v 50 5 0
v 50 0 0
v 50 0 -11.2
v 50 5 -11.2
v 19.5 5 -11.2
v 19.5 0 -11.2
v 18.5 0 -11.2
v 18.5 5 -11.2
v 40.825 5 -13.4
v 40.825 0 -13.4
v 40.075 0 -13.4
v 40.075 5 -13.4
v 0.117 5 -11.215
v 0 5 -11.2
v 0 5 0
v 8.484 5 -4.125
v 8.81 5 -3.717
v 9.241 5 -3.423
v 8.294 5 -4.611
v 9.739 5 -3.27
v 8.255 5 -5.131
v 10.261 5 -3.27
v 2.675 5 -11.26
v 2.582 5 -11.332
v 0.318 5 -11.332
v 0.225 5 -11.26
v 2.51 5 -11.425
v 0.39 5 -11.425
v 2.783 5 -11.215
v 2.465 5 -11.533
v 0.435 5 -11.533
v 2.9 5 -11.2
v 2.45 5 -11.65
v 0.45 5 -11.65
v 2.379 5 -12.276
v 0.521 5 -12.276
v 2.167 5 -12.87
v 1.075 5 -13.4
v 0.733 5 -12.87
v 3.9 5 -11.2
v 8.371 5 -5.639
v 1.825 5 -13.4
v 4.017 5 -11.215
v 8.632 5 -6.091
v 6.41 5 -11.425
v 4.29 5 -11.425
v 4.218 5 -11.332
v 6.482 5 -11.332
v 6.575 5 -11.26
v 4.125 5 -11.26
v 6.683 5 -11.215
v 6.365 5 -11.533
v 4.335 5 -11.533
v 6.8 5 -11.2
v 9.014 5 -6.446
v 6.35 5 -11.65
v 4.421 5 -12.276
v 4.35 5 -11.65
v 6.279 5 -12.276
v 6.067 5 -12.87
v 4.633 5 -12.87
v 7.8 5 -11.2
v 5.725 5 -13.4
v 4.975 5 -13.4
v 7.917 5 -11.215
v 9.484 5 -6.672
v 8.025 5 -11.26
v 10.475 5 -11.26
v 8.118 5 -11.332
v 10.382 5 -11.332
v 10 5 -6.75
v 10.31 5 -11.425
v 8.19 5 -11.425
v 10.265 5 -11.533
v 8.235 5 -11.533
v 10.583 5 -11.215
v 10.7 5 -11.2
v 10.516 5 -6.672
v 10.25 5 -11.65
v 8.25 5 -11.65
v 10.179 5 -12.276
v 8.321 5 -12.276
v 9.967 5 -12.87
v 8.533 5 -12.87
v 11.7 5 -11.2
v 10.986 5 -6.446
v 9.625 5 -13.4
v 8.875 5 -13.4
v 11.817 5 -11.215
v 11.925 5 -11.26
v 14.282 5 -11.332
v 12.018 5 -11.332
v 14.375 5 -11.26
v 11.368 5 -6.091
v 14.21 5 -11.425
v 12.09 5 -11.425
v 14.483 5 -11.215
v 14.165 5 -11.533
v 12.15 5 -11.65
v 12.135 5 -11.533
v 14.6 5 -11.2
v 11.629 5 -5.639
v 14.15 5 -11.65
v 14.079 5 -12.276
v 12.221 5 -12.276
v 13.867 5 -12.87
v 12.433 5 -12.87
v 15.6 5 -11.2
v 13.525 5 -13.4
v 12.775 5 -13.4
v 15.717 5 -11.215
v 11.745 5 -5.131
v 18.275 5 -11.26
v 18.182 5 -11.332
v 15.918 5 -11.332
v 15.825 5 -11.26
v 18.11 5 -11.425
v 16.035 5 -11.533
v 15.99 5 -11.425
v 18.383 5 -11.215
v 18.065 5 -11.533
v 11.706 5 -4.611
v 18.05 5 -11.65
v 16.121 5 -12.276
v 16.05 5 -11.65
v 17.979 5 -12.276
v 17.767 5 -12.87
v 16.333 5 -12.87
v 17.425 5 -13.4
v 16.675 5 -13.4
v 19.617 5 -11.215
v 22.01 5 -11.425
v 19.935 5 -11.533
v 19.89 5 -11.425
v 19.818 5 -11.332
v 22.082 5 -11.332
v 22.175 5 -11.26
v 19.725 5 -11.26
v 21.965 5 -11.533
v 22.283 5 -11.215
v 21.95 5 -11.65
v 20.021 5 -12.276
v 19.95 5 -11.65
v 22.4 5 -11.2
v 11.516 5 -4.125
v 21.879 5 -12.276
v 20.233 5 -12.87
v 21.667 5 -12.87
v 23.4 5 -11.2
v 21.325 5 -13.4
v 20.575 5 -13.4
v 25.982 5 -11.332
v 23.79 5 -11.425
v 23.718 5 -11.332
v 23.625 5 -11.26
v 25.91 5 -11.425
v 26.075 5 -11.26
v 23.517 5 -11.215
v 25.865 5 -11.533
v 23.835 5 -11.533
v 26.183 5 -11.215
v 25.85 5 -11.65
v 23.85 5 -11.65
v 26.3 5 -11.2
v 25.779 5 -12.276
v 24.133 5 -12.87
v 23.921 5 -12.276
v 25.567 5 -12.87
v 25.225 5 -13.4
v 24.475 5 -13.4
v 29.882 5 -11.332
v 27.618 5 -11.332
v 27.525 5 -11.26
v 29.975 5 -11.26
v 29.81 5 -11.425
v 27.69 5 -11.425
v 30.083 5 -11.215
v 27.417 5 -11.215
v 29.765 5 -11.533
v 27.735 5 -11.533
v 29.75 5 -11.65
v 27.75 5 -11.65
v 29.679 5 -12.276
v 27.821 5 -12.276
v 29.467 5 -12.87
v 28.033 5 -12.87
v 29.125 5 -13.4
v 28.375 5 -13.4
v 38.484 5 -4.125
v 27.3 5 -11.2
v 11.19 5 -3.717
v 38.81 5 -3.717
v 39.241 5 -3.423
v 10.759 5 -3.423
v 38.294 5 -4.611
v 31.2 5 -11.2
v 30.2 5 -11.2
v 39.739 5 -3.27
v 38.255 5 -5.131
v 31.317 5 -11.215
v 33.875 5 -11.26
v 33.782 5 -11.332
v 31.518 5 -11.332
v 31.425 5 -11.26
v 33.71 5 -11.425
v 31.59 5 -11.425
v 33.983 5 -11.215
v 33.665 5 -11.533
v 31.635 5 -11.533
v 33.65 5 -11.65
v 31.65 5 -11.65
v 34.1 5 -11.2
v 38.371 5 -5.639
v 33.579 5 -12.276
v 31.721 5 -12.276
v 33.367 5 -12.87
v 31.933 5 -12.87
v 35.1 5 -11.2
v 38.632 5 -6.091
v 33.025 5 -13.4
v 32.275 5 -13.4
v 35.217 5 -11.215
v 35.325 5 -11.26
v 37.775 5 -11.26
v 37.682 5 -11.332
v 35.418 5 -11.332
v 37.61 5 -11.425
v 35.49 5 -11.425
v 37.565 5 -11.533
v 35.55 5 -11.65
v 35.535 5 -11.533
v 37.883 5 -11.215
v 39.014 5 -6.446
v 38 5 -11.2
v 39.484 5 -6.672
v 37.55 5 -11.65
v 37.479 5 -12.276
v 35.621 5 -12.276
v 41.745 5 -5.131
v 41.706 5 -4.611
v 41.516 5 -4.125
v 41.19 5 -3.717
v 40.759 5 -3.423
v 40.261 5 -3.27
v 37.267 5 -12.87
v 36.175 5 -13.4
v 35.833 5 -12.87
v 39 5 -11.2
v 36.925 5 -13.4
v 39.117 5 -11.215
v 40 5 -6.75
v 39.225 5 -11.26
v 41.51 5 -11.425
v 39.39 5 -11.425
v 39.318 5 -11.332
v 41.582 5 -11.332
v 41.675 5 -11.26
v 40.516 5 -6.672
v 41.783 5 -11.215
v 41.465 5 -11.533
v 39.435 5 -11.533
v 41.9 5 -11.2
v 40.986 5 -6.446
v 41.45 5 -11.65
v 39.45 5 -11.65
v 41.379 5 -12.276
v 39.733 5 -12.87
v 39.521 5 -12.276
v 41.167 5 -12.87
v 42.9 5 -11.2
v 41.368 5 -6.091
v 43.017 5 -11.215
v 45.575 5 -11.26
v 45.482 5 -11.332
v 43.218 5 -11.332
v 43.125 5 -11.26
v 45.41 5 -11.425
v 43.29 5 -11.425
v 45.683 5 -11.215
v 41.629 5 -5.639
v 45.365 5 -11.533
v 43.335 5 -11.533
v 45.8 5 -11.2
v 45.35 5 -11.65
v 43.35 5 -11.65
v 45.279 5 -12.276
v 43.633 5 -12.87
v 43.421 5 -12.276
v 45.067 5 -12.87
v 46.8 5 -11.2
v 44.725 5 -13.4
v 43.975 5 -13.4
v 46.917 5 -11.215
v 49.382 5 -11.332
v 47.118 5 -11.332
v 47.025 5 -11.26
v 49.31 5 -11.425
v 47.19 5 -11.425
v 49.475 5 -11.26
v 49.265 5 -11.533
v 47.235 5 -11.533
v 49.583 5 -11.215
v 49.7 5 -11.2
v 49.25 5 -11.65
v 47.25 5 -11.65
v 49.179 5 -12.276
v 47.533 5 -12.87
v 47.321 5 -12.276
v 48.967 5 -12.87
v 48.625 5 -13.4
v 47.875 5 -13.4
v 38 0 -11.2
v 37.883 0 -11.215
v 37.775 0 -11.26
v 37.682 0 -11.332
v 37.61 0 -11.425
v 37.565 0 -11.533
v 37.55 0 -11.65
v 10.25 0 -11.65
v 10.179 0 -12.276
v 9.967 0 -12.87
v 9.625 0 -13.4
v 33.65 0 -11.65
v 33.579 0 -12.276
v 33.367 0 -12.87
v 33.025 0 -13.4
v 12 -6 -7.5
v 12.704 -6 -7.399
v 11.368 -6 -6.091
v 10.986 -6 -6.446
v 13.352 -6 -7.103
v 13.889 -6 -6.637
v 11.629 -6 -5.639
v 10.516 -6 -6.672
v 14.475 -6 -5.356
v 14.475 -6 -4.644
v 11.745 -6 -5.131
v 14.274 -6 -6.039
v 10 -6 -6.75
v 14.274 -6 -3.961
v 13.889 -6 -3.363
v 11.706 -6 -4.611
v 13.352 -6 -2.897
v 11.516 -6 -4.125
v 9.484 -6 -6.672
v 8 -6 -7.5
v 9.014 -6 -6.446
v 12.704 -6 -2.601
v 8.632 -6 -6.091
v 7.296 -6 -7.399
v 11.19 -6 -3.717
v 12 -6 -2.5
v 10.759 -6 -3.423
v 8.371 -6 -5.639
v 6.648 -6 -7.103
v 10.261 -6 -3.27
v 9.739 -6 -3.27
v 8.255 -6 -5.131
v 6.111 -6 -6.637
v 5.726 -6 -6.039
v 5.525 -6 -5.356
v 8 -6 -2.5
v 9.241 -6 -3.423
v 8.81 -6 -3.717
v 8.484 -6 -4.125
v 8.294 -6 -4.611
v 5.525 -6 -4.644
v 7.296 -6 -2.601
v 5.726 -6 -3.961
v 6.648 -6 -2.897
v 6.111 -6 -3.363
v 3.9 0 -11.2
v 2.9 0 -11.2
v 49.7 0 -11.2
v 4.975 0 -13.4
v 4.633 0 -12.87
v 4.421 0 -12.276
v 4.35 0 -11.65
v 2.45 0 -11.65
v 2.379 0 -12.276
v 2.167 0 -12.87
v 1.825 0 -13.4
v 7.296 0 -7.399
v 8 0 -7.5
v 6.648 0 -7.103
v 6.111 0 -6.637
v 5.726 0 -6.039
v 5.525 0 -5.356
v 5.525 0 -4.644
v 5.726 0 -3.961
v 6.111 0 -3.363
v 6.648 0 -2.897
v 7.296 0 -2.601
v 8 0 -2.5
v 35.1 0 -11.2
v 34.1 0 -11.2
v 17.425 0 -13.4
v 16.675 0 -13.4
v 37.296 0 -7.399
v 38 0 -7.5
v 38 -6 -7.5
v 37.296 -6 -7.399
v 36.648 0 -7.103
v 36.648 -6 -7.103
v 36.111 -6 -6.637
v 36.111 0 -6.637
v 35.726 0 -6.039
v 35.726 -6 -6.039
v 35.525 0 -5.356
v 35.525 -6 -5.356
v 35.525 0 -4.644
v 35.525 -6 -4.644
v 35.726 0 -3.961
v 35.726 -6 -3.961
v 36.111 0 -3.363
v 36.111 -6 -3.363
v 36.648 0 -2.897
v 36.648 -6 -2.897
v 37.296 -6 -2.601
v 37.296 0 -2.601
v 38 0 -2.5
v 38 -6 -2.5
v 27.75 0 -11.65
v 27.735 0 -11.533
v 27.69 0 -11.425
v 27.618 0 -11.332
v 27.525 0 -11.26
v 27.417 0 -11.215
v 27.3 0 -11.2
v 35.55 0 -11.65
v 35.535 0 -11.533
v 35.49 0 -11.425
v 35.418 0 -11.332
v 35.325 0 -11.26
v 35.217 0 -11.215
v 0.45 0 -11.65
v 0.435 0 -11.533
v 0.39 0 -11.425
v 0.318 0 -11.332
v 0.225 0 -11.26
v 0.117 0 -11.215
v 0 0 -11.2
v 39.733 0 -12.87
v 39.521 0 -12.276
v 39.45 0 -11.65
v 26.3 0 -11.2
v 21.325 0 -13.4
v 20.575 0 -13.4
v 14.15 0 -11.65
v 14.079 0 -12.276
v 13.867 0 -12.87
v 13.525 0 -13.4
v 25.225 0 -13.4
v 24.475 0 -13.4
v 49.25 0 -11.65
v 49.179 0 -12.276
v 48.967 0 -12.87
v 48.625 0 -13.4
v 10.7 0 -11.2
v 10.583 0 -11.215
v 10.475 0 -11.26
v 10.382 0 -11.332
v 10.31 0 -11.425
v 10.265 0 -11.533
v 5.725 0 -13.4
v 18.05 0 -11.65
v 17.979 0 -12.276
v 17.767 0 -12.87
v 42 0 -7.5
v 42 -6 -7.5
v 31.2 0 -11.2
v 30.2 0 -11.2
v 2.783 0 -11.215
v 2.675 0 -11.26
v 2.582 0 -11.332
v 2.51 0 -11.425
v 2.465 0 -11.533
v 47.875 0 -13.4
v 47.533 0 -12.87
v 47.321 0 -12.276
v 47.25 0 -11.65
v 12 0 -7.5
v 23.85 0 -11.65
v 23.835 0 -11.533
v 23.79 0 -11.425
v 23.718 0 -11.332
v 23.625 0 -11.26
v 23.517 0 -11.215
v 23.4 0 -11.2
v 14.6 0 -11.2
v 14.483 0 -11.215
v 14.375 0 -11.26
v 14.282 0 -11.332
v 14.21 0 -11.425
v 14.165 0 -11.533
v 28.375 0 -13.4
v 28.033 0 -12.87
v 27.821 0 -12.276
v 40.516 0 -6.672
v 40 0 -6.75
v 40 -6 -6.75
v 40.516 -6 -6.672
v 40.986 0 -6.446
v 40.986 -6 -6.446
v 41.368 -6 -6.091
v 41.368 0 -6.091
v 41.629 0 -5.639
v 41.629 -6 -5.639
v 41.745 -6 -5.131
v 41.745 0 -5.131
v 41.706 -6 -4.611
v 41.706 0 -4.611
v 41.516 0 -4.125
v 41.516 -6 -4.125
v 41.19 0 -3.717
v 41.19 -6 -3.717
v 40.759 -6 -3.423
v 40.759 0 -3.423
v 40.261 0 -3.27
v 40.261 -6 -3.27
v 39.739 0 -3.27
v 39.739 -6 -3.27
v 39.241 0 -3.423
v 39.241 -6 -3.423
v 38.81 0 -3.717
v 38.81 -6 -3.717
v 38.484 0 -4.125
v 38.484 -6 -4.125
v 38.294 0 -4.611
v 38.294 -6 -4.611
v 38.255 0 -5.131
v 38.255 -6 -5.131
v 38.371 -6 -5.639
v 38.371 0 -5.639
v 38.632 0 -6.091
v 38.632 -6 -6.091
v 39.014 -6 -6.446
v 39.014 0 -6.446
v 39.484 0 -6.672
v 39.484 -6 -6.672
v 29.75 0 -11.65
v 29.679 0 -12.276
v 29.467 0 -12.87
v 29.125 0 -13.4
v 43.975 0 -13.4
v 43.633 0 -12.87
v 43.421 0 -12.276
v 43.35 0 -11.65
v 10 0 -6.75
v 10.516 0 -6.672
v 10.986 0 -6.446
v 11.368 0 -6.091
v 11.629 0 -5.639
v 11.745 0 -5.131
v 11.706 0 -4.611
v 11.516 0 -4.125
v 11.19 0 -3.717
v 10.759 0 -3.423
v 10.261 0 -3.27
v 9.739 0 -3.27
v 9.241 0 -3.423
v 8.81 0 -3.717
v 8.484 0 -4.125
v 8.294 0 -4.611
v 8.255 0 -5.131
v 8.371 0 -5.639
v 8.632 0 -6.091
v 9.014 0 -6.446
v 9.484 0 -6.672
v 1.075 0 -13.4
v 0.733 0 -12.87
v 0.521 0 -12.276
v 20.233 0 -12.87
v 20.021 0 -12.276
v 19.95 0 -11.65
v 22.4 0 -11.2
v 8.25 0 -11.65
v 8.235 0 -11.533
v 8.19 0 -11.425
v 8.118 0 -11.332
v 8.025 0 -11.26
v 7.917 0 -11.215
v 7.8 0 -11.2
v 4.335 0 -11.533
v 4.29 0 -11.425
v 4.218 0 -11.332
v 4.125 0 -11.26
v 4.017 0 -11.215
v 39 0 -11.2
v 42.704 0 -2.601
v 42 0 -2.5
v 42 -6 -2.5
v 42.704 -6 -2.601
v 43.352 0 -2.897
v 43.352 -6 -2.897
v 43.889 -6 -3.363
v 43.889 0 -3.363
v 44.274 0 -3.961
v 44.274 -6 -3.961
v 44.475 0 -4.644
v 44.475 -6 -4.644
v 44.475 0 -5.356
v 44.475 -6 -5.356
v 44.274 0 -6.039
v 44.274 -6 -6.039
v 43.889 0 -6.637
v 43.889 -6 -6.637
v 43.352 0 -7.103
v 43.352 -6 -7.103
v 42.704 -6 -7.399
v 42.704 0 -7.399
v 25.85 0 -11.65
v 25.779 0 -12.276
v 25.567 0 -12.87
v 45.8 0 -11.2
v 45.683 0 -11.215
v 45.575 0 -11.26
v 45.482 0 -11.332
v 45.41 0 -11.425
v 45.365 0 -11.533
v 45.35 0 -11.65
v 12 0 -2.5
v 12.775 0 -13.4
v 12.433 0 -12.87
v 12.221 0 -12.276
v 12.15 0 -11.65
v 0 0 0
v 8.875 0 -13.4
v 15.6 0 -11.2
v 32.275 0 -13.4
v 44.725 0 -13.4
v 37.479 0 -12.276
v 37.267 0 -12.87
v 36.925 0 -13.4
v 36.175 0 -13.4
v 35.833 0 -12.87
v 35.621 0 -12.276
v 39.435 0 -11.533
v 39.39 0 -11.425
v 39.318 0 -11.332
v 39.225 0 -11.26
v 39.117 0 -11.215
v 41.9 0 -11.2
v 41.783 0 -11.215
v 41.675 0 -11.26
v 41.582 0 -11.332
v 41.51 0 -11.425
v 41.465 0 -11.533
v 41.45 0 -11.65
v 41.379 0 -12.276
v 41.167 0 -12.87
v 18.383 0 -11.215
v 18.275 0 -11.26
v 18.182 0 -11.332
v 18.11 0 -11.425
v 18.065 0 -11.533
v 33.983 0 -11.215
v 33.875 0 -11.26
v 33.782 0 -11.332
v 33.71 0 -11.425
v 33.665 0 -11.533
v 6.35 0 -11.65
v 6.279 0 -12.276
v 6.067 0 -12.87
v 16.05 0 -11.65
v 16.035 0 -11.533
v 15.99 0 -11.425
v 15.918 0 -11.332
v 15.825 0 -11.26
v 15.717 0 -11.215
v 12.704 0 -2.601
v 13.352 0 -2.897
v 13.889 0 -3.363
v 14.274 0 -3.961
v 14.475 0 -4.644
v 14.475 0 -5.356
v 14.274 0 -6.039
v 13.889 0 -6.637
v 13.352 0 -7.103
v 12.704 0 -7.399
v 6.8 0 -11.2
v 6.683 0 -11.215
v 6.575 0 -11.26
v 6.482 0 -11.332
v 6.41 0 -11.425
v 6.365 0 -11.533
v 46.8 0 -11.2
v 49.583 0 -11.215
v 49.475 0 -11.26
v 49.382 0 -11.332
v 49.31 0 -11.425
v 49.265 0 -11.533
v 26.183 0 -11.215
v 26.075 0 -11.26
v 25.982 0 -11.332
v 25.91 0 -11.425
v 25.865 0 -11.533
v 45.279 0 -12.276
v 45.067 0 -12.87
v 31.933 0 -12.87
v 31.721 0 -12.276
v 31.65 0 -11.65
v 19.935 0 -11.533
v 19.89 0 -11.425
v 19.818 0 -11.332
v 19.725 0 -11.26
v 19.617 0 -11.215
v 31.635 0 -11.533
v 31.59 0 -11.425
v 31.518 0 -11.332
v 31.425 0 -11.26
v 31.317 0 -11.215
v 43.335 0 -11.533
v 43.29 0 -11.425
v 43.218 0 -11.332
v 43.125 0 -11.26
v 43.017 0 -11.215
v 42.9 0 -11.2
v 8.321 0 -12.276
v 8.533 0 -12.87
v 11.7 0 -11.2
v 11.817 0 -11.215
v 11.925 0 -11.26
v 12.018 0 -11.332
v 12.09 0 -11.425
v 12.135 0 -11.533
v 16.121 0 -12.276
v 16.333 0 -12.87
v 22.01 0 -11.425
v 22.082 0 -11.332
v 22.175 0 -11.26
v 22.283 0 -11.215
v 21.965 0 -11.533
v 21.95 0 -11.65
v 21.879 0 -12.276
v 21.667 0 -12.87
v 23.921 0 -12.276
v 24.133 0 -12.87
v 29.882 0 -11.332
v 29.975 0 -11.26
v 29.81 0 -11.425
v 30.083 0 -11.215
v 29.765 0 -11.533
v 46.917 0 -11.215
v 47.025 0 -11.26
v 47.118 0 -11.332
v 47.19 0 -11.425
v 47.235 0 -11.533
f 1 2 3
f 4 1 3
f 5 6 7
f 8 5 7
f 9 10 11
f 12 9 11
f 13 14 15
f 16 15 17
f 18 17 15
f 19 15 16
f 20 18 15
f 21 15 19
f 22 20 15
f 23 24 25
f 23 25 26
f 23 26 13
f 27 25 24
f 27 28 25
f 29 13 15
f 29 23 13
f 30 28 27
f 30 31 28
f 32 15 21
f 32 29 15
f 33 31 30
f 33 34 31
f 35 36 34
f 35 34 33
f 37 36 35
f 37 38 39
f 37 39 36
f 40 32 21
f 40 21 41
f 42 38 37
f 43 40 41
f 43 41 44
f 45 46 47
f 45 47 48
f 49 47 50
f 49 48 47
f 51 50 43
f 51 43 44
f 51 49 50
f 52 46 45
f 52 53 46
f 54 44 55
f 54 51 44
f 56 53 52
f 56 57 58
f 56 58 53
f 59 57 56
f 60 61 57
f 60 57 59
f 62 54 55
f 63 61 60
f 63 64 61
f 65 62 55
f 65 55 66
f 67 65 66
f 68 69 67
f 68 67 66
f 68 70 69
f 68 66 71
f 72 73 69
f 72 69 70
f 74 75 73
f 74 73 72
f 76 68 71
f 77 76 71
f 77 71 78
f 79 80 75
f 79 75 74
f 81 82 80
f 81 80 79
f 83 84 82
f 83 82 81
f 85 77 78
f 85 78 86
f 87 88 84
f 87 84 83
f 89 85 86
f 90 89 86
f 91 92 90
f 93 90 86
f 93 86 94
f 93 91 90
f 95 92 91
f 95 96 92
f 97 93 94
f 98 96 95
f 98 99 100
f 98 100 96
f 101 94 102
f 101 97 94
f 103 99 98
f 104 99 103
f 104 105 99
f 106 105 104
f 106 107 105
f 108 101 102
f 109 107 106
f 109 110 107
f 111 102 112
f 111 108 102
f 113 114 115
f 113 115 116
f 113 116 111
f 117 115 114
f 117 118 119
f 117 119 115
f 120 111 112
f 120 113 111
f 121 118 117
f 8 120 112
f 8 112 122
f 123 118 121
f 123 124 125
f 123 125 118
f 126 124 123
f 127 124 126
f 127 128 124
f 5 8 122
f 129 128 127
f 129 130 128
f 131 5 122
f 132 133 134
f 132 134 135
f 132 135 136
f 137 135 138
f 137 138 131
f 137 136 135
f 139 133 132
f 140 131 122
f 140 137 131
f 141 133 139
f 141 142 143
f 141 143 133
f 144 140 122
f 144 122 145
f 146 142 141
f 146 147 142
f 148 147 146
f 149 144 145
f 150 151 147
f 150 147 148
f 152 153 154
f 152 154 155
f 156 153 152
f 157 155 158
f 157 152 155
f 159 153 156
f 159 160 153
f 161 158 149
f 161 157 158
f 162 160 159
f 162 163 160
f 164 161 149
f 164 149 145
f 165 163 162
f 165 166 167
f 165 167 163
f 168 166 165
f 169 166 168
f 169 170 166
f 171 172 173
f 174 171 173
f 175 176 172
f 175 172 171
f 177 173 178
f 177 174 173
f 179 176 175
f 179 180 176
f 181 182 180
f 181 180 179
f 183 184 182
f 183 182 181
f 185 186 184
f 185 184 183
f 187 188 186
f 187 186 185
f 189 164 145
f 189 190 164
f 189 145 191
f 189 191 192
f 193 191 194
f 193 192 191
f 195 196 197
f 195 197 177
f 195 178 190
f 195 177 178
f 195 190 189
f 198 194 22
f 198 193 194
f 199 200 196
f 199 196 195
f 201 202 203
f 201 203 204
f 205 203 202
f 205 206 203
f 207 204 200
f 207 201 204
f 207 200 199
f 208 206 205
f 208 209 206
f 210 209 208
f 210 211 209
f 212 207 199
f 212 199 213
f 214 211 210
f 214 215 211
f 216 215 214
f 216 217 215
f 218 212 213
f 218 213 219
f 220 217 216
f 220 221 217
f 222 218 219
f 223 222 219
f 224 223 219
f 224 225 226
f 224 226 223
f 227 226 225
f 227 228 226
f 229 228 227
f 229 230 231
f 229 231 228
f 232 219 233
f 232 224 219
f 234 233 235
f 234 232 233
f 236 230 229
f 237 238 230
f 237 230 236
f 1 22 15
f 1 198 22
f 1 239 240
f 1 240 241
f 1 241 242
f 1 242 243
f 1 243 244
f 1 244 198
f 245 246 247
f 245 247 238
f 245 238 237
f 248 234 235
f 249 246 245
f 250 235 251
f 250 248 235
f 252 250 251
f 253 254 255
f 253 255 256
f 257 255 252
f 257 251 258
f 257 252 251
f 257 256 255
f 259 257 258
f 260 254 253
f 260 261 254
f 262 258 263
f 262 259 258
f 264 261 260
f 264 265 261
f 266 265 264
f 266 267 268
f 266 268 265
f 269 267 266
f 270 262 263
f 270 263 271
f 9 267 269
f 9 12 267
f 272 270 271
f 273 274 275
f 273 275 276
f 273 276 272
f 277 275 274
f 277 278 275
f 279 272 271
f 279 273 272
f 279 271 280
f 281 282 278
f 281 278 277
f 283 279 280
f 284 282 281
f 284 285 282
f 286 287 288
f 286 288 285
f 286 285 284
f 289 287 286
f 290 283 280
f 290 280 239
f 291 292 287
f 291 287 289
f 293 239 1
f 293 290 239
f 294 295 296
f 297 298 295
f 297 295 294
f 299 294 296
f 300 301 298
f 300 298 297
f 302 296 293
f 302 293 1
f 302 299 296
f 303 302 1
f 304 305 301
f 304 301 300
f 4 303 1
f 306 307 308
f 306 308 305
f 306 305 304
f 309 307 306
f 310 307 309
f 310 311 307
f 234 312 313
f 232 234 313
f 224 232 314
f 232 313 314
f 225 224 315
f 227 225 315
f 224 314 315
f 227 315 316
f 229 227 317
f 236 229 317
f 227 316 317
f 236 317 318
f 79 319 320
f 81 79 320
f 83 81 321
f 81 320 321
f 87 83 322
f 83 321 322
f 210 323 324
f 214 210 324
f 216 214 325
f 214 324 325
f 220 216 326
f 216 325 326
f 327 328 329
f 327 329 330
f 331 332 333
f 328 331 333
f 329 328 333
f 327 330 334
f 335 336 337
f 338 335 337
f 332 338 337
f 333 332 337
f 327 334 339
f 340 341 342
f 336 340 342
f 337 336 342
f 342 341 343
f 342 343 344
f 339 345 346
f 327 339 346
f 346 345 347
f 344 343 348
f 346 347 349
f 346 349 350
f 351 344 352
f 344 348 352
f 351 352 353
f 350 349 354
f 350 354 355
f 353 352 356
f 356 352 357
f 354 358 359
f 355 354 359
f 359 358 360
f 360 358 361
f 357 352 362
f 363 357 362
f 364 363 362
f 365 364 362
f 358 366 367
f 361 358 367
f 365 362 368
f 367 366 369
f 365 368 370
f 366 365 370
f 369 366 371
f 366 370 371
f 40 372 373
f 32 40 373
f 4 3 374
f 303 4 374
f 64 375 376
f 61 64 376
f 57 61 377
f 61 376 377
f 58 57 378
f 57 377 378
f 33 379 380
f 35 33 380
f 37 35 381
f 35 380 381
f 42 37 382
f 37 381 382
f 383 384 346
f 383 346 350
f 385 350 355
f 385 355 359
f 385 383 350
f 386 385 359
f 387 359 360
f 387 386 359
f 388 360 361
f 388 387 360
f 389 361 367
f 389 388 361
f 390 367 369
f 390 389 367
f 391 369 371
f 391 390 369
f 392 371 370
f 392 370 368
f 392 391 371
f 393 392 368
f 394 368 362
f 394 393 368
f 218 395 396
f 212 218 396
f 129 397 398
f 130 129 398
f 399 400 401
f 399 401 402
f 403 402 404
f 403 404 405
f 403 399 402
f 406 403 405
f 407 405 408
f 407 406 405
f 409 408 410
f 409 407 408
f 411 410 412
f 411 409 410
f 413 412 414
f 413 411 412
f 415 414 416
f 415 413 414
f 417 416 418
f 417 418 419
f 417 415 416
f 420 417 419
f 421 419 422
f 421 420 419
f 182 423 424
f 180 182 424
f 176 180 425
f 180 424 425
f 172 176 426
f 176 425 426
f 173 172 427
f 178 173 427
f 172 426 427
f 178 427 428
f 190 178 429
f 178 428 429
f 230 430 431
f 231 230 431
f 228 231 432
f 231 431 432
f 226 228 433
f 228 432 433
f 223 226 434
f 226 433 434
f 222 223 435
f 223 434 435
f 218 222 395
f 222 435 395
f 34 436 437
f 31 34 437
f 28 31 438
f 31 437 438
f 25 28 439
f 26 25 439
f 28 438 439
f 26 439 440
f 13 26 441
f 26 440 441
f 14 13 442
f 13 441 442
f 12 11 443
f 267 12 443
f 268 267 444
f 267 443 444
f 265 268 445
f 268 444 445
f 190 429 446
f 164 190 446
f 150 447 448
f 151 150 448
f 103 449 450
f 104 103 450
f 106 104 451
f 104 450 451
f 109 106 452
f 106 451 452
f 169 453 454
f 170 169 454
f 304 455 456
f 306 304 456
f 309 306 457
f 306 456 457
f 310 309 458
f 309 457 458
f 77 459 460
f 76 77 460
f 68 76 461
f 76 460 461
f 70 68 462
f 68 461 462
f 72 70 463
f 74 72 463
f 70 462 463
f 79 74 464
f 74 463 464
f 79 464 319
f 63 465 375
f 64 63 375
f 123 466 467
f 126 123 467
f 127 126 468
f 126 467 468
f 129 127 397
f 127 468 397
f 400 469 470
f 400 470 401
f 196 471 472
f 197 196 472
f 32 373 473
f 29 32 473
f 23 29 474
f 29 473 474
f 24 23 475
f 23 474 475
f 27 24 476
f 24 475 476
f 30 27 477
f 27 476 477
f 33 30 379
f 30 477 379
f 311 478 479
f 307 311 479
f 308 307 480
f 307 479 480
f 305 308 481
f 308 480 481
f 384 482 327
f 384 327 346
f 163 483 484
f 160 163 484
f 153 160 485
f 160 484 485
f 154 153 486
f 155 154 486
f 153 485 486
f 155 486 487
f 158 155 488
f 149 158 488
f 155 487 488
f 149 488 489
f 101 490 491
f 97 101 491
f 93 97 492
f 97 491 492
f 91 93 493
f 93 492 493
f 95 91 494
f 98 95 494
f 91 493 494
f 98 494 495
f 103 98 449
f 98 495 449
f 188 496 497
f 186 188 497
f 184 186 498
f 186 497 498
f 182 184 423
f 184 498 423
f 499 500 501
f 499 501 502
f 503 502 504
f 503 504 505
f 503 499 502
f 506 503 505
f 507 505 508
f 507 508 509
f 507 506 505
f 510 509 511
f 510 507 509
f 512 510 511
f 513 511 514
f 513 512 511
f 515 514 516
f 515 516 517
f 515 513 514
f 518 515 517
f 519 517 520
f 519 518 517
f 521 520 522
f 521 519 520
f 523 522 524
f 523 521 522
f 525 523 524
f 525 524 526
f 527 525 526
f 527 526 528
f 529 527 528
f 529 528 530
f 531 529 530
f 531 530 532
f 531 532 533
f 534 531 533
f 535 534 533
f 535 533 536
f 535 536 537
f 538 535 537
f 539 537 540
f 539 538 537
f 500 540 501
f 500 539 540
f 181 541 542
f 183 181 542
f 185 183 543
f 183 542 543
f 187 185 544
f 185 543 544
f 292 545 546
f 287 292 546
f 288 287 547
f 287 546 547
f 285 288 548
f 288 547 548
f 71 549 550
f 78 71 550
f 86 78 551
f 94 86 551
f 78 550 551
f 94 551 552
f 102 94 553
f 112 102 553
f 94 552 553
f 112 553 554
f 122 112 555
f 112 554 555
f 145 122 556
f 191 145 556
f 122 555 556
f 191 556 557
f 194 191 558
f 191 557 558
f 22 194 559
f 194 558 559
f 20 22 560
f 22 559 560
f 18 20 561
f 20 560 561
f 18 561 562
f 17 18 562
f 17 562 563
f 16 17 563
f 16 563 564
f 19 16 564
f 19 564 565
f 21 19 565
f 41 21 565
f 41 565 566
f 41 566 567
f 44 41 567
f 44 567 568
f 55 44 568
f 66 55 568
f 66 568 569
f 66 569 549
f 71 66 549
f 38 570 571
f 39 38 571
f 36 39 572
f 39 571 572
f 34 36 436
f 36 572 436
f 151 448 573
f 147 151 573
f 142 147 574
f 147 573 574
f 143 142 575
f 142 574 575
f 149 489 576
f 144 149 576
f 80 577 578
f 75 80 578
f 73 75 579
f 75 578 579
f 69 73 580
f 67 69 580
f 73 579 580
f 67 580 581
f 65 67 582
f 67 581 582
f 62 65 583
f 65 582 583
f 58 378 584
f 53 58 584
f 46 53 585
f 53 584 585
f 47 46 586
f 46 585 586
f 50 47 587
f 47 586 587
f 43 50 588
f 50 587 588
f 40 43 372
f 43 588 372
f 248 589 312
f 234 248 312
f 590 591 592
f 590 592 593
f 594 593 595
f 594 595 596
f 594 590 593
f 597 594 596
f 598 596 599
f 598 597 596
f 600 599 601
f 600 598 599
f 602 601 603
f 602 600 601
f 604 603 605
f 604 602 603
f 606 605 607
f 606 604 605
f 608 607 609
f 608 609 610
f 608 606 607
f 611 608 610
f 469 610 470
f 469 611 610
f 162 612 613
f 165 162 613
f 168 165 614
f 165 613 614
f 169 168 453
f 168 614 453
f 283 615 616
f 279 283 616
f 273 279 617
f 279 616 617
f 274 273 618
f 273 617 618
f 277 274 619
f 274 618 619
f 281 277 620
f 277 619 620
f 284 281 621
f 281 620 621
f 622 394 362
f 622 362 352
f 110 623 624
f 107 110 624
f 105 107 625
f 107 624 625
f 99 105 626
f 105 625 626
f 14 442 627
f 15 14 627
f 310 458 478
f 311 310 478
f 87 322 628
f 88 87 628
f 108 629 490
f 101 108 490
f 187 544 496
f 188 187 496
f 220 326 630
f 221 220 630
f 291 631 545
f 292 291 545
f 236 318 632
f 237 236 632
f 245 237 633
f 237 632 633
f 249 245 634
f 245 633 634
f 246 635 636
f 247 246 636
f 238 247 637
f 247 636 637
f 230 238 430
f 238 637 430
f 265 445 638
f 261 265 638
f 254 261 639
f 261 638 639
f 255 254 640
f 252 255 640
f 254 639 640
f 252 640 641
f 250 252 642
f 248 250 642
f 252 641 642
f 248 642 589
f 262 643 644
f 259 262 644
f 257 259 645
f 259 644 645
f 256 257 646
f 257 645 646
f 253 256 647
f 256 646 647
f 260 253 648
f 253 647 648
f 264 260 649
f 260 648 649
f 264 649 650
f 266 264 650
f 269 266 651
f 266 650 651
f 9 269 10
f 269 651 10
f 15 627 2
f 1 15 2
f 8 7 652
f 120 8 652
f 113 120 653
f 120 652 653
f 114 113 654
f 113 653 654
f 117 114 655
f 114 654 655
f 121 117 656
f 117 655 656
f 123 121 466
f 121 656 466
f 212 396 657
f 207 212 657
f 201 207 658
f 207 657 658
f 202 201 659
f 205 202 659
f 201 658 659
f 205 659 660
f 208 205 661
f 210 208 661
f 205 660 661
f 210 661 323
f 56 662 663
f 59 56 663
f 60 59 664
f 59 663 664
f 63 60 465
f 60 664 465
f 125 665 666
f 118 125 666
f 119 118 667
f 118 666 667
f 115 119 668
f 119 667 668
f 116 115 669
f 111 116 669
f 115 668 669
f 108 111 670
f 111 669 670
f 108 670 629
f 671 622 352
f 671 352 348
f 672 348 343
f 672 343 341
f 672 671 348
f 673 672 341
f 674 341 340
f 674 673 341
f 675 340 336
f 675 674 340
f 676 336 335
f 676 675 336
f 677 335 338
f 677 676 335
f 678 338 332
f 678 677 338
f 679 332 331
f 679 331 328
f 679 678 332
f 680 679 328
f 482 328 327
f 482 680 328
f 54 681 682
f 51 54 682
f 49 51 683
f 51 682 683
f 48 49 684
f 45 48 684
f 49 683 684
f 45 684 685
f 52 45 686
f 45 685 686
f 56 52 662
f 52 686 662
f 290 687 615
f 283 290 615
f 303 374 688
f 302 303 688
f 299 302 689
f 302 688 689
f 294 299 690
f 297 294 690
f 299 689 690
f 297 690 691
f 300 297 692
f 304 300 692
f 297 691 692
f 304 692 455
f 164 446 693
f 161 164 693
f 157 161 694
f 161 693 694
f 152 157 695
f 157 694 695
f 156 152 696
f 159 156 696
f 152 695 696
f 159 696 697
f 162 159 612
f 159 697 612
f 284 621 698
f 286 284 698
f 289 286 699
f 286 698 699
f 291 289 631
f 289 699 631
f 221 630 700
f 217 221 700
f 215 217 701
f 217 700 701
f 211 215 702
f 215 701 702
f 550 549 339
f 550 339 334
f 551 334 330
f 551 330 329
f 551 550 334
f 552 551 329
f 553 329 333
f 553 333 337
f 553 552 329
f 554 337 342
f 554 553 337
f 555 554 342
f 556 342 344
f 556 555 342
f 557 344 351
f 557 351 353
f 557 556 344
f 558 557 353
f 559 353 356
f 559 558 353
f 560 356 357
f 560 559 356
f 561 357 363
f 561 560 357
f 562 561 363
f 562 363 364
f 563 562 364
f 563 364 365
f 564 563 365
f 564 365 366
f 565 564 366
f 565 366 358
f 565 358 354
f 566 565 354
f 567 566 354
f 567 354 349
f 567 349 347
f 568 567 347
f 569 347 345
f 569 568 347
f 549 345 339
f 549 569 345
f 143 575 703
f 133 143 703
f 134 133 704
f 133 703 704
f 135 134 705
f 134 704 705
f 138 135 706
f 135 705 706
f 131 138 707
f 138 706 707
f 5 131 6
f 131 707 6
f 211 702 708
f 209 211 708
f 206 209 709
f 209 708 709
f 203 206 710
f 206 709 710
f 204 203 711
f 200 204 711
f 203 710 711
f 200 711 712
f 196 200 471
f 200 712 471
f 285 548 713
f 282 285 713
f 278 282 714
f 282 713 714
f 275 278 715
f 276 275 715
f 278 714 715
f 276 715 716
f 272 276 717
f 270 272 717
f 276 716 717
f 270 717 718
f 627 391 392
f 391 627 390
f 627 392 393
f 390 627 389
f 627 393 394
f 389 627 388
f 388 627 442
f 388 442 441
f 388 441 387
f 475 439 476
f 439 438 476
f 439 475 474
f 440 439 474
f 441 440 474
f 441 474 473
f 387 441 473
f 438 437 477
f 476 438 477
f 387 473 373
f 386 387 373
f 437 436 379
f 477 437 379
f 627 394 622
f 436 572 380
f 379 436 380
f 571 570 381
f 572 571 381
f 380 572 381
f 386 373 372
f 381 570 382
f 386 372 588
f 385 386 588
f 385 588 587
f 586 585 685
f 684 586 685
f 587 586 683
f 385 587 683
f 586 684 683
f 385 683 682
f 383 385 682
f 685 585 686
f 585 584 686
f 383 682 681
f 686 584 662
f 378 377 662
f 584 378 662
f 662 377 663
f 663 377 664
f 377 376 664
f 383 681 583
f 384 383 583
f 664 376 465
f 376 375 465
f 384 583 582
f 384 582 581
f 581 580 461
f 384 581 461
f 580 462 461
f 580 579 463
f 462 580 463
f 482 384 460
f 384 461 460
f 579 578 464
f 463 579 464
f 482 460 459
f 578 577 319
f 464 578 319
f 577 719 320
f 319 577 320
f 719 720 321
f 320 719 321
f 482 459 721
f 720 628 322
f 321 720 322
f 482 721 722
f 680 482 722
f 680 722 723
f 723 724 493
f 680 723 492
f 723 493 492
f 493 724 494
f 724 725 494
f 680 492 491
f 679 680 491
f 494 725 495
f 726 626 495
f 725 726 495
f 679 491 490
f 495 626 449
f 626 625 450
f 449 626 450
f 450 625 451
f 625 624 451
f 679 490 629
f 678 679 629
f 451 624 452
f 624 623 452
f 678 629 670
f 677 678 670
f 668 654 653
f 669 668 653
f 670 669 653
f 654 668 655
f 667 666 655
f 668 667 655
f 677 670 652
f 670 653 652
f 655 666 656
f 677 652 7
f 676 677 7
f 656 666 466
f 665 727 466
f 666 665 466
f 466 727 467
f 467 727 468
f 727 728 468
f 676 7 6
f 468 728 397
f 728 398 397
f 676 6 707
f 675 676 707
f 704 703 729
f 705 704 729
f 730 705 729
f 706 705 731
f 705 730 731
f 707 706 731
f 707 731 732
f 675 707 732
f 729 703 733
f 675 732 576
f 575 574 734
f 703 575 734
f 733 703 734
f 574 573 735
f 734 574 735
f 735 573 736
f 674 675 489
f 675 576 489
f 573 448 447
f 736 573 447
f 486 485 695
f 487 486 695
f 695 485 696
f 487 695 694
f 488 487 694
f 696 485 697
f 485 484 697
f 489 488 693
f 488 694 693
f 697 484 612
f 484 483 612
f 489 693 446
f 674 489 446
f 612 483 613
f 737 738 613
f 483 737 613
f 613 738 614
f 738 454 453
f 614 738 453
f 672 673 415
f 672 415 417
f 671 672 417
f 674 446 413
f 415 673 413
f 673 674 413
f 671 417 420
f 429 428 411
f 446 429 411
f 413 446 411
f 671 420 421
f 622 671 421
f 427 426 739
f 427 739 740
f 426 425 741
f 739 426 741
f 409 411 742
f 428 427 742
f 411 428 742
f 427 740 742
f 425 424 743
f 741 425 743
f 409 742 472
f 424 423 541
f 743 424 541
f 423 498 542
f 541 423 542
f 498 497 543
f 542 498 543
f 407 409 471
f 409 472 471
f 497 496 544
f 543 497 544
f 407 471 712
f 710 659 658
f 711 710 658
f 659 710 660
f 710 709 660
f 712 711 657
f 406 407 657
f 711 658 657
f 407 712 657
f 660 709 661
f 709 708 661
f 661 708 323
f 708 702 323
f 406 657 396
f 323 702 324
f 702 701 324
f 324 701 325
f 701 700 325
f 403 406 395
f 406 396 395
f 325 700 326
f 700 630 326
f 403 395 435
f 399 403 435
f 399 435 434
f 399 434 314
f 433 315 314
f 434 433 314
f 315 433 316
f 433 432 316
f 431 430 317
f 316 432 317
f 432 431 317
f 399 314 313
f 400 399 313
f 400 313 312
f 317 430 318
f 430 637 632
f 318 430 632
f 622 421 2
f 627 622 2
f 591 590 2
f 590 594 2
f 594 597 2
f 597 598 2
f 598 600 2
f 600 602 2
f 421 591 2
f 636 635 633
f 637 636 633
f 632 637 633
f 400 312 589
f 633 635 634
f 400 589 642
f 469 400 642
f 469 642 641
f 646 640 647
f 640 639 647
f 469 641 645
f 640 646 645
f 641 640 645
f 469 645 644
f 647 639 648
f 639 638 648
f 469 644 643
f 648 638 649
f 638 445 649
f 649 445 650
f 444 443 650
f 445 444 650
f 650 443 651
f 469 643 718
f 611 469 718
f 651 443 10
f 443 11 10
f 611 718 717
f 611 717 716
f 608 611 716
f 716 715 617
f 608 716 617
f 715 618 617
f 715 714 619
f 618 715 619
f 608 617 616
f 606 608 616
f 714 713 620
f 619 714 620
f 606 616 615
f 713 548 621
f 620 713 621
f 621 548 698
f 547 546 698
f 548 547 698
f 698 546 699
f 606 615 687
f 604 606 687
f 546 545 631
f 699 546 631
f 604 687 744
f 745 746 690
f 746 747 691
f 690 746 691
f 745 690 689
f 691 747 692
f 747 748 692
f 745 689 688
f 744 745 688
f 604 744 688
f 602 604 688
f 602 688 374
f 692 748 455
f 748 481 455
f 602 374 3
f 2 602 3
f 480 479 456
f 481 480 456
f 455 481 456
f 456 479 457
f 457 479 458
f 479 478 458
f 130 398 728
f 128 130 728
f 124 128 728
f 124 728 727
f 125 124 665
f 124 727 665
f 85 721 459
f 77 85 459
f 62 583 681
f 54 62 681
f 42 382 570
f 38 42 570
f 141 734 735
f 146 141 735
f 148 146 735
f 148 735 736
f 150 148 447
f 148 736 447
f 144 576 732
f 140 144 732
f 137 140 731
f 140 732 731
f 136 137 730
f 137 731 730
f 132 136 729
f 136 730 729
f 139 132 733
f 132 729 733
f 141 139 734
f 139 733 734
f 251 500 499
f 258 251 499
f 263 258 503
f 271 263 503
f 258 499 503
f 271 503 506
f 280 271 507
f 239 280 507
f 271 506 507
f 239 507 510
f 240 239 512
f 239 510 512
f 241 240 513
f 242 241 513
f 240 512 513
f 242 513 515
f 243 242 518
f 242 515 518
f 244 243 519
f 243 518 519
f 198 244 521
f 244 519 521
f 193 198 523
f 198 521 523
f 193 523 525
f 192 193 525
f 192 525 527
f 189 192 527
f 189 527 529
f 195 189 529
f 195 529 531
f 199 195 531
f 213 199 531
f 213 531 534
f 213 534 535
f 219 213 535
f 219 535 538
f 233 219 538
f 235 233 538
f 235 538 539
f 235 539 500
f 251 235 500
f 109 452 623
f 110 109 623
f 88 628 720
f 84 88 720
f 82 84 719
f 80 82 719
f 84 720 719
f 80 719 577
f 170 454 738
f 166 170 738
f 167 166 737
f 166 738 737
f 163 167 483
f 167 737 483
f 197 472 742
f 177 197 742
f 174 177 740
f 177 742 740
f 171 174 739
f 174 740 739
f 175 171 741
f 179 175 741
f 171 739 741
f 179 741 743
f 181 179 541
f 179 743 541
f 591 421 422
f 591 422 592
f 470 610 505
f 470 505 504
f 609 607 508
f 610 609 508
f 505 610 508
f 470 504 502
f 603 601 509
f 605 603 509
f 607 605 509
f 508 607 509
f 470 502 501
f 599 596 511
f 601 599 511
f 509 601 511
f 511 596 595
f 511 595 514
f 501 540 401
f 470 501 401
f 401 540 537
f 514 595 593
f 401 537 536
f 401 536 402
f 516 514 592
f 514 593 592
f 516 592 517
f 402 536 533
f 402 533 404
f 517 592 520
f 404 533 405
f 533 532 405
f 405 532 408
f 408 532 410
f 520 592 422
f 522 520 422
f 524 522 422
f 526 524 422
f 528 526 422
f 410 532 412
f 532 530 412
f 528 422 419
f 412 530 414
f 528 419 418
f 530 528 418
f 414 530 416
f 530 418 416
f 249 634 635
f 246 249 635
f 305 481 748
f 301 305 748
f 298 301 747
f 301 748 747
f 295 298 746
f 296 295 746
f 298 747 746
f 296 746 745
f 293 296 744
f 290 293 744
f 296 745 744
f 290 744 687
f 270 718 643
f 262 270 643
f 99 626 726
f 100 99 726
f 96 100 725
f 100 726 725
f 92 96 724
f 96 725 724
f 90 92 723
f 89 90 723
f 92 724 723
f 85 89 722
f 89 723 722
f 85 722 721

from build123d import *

# Parameters (mm, degrees)
BOSS_EXTRUDE1_DEPTH = 5
SKETCH2_R           = 1.75
BOSS_EXTRUDE2_DEPTH = 6
CUT_EXTRUDE1_REACH  = 54.111
SKETCH3_R           = 1.75


with BuildPart() as part:
    # Sketch1 → Boss-Extrude1 (new body)
    with BuildSketch(Plane(origin=(0, 0, 0), x_dir=(1, 0, 0), z_dir=(0, 1, 0))):
        with BuildLine():
            Line((0, 0), (50, 0))
            Line((50, 0), (50, 11.2))
            Line((50, 11.2), (49.7, 11.2))
            ThreePointArc((49.7, 11.2), (49.38158785, 11.33158785), (49.25, 11.65))
            ThreePointArc((49.25, 11.65), (49.089793883, 12.579390672), (48.625, 13.4))
            Line((48.625, 13.4), (47.875, 13.4))
            ThreePointArc((47.875, 13.4), (47.410206117, 12.579390672), (47.25, 11.65))
            ThreePointArc((47.25, 11.65), (47.11841215, 11.33158785), (46.8, 11.2))
            Line((46.8, 11.2), (45.8, 11.2))
            ThreePointArc((45.8, 11.2), (45.48158785, 11.33158785), (45.35, 11.65))
            ThreePointArc((45.35, 11.65), (45.189793883, 12.579390672), (44.725, 13.4))
            Line((44.725, 13.4), (43.975, 13.4))
            ThreePointArc((43.975, 13.4), (43.510206117, 12.579390672), (43.35, 11.65))
            ThreePointArc((43.35, 11.65), (43.21841215, 11.33158785), (42.9, 11.2))
            Line((42.9, 11.2), (41.9, 11.2))
            ThreePointArc((41.9, 11.2), (41.58158785, 11.33158785), (41.45, 11.65))
            ThreePointArc((41.45, 11.65), (41.289793883, 12.579390672), (40.825, 13.4))
            Line((40.825, 13.4), (40.075, 13.4))
            ThreePointArc((40.075, 13.4), (39.610206117, 12.579390672), (39.45, 11.65))
            ThreePointArc((39.45, 11.65), (39.31841215, 11.33158785), (39, 11.2))
            Line((39, 11.2), (38, 11.2))
            ThreePointArc((38, 11.2), (37.68158785, 11.33158785), (37.55, 11.65))
            ThreePointArc((37.55, 11.65), (37.389793883, 12.579390672), (36.925, 13.4))
            Line((36.925, 13.4), (36.175, 13.4))
            ThreePointArc((36.175, 13.4), (35.710206117, 12.579390672), (35.55, 11.65))
            ThreePointArc((35.55, 11.65), (35.41841215, 11.33158785), (35.1, 11.2))
            Line((35.1, 11.2), (34.1, 11.2))
            ThreePointArc((34.1, 11.2), (33.78158785, 11.33158785), (33.65, 11.65))
            ThreePointArc((33.65, 11.65), (33.489793883, 12.579390672), (33.025, 13.4))
            Line((33.025, 13.4), (32.275, 13.4))
            ThreePointArc((32.275, 13.4), (31.810206117, 12.579390672), (31.65, 11.65))
            ThreePointArc((31.65, 11.65), (31.51841215, 11.33158785), (31.2, 11.2))
            Line((31.2, 11.2), (30.2, 11.2))
            ThreePointArc((30.2, 11.2), (29.88158785, 11.33158785), (29.75, 11.65))
            ThreePointArc((29.75, 11.65), (29.589793883, 12.579390672), (29.125, 13.4))
            Line((29.125, 13.4), (28.375, 13.4))
            ThreePointArc((28.375, 13.4), (27.910206117, 12.579390672), (27.75, 11.65))
            ThreePointArc((27.75, 11.65), (27.61841215, 11.33158785), (27.3, 11.2))
            Line((27.3, 11.2), (26.3, 11.2))
            ThreePointArc((26.3, 11.2), (25.98158785, 11.33158785), (25.85, 11.65))
            ThreePointArc((25.85, 11.65), (25.689793883, 12.579390672), (25.225, 13.4))
            Line((25.225, 13.4), (24.475, 13.4))
            ThreePointArc((24.475, 13.4), (24.010206117, 12.579390672), (23.85, 11.65))
            ThreePointArc((23.85, 11.65), (23.71841215, 11.33158785), (23.4, 11.2))
            Line((23.4, 11.2), (22.4, 11.2))
            ThreePointArc((22.4, 11.2), (22.08158785, 11.33158785), (21.95, 11.65))
            ThreePointArc((21.95, 11.65), (21.789793883, 12.579390672), (21.325, 13.4))
            Line((21.325, 13.4), (20.575, 13.4))
            ThreePointArc((20.575, 13.4), (20.110206117, 12.579390672), (19.95, 11.65))
            ThreePointArc((19.95, 11.65), (19.81841215, 11.33158785), (19.5, 11.2))
            Line((19.5, 11.2), (18.5, 11.2))
            ThreePointArc((18.5, 11.2), (18.18158785, 11.33158785), (18.05, 11.65))
            ThreePointArc((18.05, 11.65), (17.889793883, 12.579390672), (17.425, 13.4))
            Line((17.425, 13.4), (16.675, 13.4))
            ThreePointArc((16.675, 13.4), (16.210206117, 12.579390672), (16.05, 11.65))
            ThreePointArc((16.05, 11.65), (15.91841215, 11.33158785), (15.6, 11.2))
            Line((15.6, 11.2), (14.6, 11.2))
            ThreePointArc((14.6, 11.2), (14.28158785, 11.33158785), (14.15, 11.65))
            ThreePointArc((14.15, 11.65), (13.989793883, 12.579390672), (13.525, 13.4))
            Line((13.525, 13.4), (12.775, 13.4))
            ThreePointArc((12.775, 13.4), (12.310206117, 12.579390672), (12.15, 11.65))
            ThreePointArc((12.15, 11.65), (12.01841215, 11.33158785), (11.7, 11.2))
            Line((11.7, 11.2), (10.7, 11.2))
            ThreePointArc((10.7, 11.2), (10.38158785, 11.33158785), (10.25, 11.65))
            ThreePointArc((10.25, 11.65), (10.089793883, 12.579390672), (9.625, 13.4))
            Line((9.625, 13.4), (8.875, 13.4))
            ThreePointArc((8.875, 13.4), (8.410206117, 12.579390672), (8.25, 11.65))
            ThreePointArc((8.25, 11.65), (8.11841215, 11.33158785), (7.8, 11.2))
            Line((7.8, 11.2), (6.8, 11.2))
            ThreePointArc((6.8, 11.2), (6.48158785, 11.33158785), (6.35, 11.65))
            ThreePointArc((6.35, 11.65), (6.189793883, 12.579390672), (5.725, 13.4))
            Line((5.725, 13.4), (4.975, 13.4))
            ThreePointArc((4.975, 13.4), (4.510206117, 12.579390672), (4.35, 11.65))
            ThreePointArc((4.35, 11.65), (4.21841215, 11.33158785), (3.9, 11.2))
            Line((3.9, 11.2), (2.9, 11.2))
            ThreePointArc((2.9, 11.2), (2.58158785, 11.33158785), (2.45, 11.65))
            ThreePointArc((2.45, 11.65), (2.289793883, 12.579390672), (1.825, 13.4))
            Line((1.825, 13.4), (1.075, 13.4))
            ThreePointArc((1.075, 13.4), (0.610206117, 12.579390672), (0.45, 11.65))
            ThreePointArc((0.45, 11.65), (0.31841215, 11.33158785), (0, 11.2))
            Line((0, 11.2), (0, 0))
        make_face()
    extrude(amount=BOSS_EXTRUDE1_DEPTH)

    # Sketch2 → Boss-Extrude2 (add)
    # profile 1 of 2: a face of its own
    with BuildSketch(Plane.XZ):
        with BuildLine():
            Line((12, -7.5), (8, -7.5))
            ThreePointArc((8, -7.5), (5.5, -5), (8, -2.5))
            Line((8, -2.5), (12, -2.5))
            ThreePointArc((12, -2.5), (14.5, -5), (12, -7.5))
        make_face()
        with Locations(Location((10, -5, 0), (0, 0, 270))):
            Circle(SKETCH2_R, mode=Mode.SUBTRACT)
    # profile 2 of 2: a face of its own
    with BuildSketch(Plane.XZ):
        with BuildLine():
            Line((42, -7.5), (38, -7.5))
            ThreePointArc((38, -7.5), (35.5, -5), (38, -2.5))
            Line((38, -2.5), (42, -2.5))
            ThreePointArc((42, -2.5), (44.5, -5), (42, -7.5))
        make_face()
        with Locations(Location((40, -5, 0), (0, 0, 270))):
            Circle(SKETCH2_R, mode=Mode.SUBTRACT)
    extrude(amount=BOSS_EXTRUDE2_DEPTH)

    # Sketch3 → Cut-Extrude1 (cut, up to next)
    with BuildSketch(Plane.XZ, mode=Mode.PRIVATE) as cut_extrude1_sk1:
        with Locations(Location((40, -5, 0), (0, 0, 270))):
            Circle(SKETCH3_R)
    cut_extrude1_tool1 = extrude(cut_extrude1_sk1.sketch, amount=-CUT_EXTRUDE1_REACH, mode=Mode.PRIVATE) & part.part
    # Sketch3 → Cut-Extrude1 (cut, up to next)
    with BuildSketch(Plane.XZ, mode=Mode.PRIVATE) as cut_extrude1_sk2:
        with Locations(Location((10, -5, 0), (0, 0, 270))):
            Circle(SKETCH3_R)
    cut_extrude1_tool2 = extrude(cut_extrude1_sk2.sketch, amount=-CUT_EXTRUDE1_REACH, mode=Mode.PRIVATE) & part.part
    add(cut_extrude1_tool1.solids().sort_by_distance((40, 0, -5))[0], mode=Mode.SUBTRACT)
    add(cut_extrude1_tool2.solids().sort_by_distance((10, 0, -5))[0], mode=Mode.SUBTRACT)


solid = part.part
